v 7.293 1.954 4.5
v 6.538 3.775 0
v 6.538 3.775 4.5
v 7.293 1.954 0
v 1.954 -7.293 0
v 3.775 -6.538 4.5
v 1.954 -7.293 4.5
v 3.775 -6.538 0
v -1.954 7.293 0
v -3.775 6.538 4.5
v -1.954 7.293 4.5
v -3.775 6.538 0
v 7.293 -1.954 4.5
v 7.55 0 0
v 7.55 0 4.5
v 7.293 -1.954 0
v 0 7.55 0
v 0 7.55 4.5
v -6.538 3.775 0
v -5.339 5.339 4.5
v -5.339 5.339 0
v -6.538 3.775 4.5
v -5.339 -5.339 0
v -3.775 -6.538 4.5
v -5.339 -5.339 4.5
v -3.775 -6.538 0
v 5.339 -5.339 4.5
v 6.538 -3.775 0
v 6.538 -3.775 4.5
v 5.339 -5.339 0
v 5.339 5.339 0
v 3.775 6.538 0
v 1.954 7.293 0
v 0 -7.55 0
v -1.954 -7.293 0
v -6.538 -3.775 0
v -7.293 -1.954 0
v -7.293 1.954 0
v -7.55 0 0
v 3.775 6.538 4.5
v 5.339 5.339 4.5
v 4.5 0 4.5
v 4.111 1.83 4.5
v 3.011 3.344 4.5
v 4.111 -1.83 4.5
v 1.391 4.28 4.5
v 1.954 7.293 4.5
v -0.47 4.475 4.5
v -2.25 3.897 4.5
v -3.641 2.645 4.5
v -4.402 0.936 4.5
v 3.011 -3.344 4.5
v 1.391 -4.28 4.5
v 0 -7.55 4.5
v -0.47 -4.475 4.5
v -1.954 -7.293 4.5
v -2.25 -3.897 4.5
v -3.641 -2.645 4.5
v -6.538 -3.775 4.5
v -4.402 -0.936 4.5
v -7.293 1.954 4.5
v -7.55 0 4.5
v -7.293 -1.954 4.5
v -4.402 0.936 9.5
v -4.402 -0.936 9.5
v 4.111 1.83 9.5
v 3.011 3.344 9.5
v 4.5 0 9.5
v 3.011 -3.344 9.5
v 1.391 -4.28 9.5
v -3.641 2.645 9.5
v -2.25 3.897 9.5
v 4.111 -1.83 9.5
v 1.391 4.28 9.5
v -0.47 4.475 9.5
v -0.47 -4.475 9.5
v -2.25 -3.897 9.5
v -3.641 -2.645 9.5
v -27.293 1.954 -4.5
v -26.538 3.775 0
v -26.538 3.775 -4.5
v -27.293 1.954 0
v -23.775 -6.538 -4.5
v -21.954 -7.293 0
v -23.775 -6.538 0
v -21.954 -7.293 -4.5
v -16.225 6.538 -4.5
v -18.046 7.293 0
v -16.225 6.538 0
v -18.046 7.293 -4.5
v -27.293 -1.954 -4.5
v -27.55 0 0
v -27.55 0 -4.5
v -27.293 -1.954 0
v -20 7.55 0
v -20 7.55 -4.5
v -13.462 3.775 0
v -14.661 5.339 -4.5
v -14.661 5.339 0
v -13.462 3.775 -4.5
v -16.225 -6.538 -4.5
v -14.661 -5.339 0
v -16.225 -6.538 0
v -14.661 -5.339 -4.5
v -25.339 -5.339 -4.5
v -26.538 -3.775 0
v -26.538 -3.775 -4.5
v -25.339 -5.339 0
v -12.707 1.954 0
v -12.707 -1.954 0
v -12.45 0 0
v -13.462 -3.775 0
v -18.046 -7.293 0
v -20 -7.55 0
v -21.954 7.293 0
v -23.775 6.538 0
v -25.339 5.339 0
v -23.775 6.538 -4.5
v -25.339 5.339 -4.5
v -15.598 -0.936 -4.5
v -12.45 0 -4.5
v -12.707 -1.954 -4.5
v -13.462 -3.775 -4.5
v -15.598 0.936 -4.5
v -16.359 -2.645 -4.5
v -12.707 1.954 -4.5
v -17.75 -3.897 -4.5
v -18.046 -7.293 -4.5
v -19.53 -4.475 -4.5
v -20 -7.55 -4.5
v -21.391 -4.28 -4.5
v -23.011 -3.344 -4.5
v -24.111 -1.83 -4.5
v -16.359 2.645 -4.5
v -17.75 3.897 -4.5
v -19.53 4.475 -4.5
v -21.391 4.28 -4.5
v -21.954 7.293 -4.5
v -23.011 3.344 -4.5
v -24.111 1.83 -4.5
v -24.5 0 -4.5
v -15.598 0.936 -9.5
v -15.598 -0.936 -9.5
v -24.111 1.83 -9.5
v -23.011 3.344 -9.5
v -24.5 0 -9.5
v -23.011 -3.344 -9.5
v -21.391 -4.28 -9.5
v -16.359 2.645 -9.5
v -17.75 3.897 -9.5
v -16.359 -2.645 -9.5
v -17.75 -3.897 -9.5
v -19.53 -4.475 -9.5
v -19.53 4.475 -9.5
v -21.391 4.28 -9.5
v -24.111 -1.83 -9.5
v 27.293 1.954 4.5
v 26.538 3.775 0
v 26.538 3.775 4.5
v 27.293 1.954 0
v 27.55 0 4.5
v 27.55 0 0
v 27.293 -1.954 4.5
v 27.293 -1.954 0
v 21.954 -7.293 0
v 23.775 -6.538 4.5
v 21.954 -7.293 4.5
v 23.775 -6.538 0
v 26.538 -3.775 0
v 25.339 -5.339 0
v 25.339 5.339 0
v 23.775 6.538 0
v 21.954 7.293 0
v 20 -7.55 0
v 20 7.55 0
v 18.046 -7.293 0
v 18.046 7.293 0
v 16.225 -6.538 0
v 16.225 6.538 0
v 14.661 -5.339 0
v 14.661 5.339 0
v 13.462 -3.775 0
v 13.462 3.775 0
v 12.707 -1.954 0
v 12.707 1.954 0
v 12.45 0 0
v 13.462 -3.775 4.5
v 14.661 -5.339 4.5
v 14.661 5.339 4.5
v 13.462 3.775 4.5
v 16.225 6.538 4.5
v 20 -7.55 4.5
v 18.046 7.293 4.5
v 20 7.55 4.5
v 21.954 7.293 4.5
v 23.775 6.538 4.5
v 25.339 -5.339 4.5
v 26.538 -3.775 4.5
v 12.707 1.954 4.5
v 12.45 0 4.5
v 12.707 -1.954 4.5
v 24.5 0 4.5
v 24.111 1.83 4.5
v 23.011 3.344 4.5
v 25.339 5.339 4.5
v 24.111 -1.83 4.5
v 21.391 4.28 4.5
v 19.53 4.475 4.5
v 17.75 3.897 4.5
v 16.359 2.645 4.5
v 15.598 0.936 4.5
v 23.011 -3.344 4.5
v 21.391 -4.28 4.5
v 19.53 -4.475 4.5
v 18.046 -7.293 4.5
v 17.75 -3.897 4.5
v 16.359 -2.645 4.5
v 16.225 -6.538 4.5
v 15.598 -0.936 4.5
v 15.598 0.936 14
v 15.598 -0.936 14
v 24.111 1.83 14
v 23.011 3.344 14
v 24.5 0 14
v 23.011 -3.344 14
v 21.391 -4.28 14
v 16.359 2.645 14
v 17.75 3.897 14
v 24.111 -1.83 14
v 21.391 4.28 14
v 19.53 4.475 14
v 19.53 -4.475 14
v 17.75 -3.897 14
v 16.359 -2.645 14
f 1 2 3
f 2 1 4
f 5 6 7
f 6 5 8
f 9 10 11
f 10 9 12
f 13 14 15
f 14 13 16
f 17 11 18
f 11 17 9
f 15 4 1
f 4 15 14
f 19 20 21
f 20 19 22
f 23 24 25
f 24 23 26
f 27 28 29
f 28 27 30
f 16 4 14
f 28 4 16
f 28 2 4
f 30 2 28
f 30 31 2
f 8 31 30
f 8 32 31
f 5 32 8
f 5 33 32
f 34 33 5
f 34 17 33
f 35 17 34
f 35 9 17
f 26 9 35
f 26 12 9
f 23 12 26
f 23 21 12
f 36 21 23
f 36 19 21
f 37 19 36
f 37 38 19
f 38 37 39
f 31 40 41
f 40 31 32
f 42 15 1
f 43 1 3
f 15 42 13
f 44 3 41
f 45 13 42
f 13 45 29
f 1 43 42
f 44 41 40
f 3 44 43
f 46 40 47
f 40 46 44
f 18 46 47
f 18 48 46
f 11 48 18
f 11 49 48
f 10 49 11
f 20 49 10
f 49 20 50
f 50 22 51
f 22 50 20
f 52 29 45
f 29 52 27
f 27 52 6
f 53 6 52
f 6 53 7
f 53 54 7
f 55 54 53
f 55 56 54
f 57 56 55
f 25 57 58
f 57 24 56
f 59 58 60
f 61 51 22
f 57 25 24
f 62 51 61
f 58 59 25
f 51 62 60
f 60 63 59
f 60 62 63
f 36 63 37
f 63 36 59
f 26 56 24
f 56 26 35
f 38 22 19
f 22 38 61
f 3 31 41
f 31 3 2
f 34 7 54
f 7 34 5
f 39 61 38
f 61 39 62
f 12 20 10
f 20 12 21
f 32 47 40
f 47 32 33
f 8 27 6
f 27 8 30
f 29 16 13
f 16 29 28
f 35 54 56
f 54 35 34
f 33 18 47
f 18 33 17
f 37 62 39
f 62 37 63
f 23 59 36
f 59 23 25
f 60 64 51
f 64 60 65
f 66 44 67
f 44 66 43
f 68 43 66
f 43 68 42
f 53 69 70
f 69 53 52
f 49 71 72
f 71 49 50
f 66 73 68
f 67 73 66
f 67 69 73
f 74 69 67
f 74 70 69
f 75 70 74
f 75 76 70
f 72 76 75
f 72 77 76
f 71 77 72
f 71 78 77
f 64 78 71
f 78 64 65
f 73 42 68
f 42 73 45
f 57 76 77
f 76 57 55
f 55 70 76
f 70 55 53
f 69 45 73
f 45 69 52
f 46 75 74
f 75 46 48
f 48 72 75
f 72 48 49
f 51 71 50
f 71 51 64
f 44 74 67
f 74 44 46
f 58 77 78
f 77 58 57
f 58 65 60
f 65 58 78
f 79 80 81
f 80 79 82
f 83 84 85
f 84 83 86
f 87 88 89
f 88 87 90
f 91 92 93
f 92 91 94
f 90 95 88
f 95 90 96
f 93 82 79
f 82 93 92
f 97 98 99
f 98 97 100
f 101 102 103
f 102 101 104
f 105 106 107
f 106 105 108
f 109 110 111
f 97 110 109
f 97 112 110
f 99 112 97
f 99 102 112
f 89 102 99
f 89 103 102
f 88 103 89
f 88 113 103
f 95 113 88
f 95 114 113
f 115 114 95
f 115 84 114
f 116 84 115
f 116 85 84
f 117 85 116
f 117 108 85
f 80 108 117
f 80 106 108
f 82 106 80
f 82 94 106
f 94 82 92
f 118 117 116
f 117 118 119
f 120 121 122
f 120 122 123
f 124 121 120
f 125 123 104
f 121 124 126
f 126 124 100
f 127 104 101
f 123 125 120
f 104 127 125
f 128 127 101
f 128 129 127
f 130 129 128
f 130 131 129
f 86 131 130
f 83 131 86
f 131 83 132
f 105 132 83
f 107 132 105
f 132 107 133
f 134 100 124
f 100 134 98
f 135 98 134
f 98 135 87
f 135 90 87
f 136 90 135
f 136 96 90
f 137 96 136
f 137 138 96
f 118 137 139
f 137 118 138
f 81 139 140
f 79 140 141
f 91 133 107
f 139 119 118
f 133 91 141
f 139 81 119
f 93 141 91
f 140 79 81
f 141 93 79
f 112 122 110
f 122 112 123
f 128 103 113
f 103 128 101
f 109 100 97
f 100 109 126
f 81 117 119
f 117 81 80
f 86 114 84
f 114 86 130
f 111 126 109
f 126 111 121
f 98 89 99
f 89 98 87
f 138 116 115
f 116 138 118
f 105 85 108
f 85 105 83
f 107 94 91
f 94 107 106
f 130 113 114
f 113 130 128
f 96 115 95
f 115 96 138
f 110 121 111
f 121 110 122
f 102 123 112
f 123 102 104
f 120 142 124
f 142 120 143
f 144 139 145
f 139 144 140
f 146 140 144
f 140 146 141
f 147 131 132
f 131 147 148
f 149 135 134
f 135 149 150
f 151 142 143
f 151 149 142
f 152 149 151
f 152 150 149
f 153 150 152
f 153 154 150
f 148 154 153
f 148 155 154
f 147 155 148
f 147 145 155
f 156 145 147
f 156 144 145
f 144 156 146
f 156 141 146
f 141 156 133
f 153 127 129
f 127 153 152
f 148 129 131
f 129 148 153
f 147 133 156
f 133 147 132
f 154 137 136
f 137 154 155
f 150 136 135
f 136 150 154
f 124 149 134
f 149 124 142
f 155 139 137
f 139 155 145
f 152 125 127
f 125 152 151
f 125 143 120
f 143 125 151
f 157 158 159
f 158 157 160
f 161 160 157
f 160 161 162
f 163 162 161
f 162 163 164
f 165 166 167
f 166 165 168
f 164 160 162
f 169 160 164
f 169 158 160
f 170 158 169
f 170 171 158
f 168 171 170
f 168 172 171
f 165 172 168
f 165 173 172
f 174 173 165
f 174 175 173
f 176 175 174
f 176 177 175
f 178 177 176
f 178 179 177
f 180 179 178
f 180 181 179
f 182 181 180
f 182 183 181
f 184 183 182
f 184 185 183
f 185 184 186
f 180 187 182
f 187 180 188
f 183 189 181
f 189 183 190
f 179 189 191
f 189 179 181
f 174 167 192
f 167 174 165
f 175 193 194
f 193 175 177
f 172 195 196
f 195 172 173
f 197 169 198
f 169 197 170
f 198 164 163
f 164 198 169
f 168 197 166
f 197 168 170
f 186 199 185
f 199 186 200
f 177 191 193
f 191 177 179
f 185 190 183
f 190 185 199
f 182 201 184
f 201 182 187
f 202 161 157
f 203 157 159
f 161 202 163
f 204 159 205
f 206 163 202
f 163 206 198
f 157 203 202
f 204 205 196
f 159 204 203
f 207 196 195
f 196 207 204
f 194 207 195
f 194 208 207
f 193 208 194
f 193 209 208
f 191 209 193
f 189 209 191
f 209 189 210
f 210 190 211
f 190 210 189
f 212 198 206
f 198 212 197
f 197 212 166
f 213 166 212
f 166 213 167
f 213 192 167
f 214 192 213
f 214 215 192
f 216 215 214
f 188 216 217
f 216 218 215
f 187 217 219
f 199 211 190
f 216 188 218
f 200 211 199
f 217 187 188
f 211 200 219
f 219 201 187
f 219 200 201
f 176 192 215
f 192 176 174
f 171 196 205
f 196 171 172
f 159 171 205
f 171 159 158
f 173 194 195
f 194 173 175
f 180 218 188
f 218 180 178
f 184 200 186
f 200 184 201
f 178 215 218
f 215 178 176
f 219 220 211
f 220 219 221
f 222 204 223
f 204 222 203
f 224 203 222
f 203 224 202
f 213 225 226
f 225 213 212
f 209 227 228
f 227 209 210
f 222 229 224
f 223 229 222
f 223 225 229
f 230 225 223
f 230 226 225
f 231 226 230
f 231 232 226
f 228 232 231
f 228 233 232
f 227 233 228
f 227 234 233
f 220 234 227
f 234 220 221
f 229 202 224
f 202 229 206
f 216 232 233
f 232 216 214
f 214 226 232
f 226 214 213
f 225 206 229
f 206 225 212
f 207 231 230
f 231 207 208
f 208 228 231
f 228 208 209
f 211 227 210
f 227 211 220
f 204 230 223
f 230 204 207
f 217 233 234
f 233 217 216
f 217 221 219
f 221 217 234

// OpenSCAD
// =====================================================
// CALCULADORA SIMPLIFICADA DE AVELLANADO
// Para tornillos de madera - Versión cilindro recto
// =====================================================

// Función que calcula el diámetro de cabeza y altura 
// según el diámetro de la rosca (D) en mm
function cabeza_tornillo(D) = 
    D <= 3 ? [5.6, 1.65] :    // [DK, K] para M3
    D <= 4 ? [7.5, 2.2] :     // M4
    D <= 5 ? [9.2, 2.5] :     // M5
    D <= 6 ? [11.0, 3.0] :    // M6
    D <= 8 ? [14.5, 4.0] :    // M8
    D <= 10 ? [18.0, 5.0] :   // M10
    D <= 12 ? [22.0, 6.0] :   // M12
    D <= 14 ? [26.0, 7.0] :   // M14
    D <= 16 ? [30.0, 8.0] :   // M16
    [D * 1.8, D * 0.5];       // Fórmula general

// =====================================================
// MÓDULO SIMPLIFICADO - CILINDRO RECTO
// =====================================================
module avellanado_cilindrico(
    diametro_rosca,          // Diámetro del tornillo en mm
    profundidad_avellano,    // Profundidad del avellanado en mm
    holgura = 0.3,           // Holgura para el diámetro
    altura_extra = 0,        // Altura adicional del avellanado en mm
    offset_z = 0             // Desplazamiento vertical en mm (default 0)
) {
    // Obtener dimensiones de la cabeza
    datos = cabeza_tornillo(diametro_rosca);
    diametro_cabeza = datos[0];
    altura_total = profundidad_avellano + altura_extra;
    
    // Crear el cilindro del avellanado
    translate([0, 0, offset_z]) 
        cylinder(h = altura_total, 
                 r = (diametro_cabeza/2) + holgura);
}

// =====================================================
// MÓDULO PARA AGUJERO PASANTE (solo diámetro)
// =====================================================
module agujero_pasante(
    diametro_rosca,          // Diámetro del tornillo en mm
    profundidad,       // Profundidad total del agujero (grosor de la pieza)
    profundidad_avellano=0,// suma del hueco de avellanado
    holgura = 0.5,            // Holgura para el diámetro
    profundidad_abs=true,
    altura_extra_pasante = 0,// Altura adicional del agujero en mm
    offset_z_pasante = 0     // Desplazamiento vertical del agujero en mm (default 0)
) {
  if(profundidad_abs)
   translate([0, 0, profundidad_avellano + offset_z_pasante]) 
        cylinder(h = profundidad - profundidad_avellano + altura_extra_pasante , 
                 r = (diametro_rosca/2) + holgura);
  
   else
    // Crear agujero cilíndrico pasante
    translate([0, 0, profundidad_avellano + offset_z_pasante]) 
        cylinder(h = profundidad + altura_extra_pasante, 
                 r = (diametro_rosca/2) + holgura);
  
}

// =====================================================
// MÓDULO COMBINADO - AVELLANADO + AGUJERO PASANTE
// =====================================================
module agujero_con_avellanado(
    diametro_rosca,          // Diámetro del tornillo en mm
    profundidad_avellano,    // Profundidad del avellanado en mm
    profundidad_pieza,       // Grosor total de la pieza en mm
    holgura_avellano = 0.3,  // Holgura para el avellanado
    holgura_pasante = 0.5,    // Holgura para el agujero pasante
    profundidad_abs=true,
    altura_extra = 0,        // Altura adicional del avellanado en mm
    offset_z = 0,            // Desplazamiento vertical en mm (default 0)
    altura_extra_pasante = 0,// Altura adicional del agujero en mm
    offset_z_pasante = 0     // Desplazamiento vertical del agujero en mm (default 0)
) {
    // Avellanado (cilindro recto)
   avellanado_cilindrico(
        diametro_rosca = diametro_rosca,
        profundidad_avellano = profundidad_avellano,
        holgura = holgura_avellano,
        altura_extra = altura_extra,
        offset_z = offset_z
    );
  
    // Agujero pasante (desde el fondo del avellanado hasta el final)
        agujero_pasante(
            diametro_rosca = diametro_rosca,
            profundidad = profundidad_pieza ,
            profundidad_avellano= profundidad_avellano,
            holgura = holgura_pasante,
            profundidad_abs=profundidad_abs,
            altura_extra_pasante = altura_extra_pasante,
            offset_z_pasante = offset_z_pasante
        );
}


// =====================================================
// FUNCIONES DE UTILIDAD
// =====================================================

// Función para obtener solo el diámetro de cabeza
function diametro_cabeza(D) = cabeza_tornillo(D)[0];

// Función para obtener solo la altura de cabeza
function altura_cabeza(D) = cabeza_tornillo(D)[1];

// =====================================================
// VISUALIZACIÓN DE EJEMPLOS
// =====================================================
translate([-20, 0, 0])
rotate([0.,180,0]){
agujero_con_avellanado(8, 4.5, 9.5);
 }
agujero_con_avellanado(8, 4.5, 9.5);

translate([20, 0, 0])
agujero_con_avellanado(8, 4.5, 9.5,profundidad_abs=false);
